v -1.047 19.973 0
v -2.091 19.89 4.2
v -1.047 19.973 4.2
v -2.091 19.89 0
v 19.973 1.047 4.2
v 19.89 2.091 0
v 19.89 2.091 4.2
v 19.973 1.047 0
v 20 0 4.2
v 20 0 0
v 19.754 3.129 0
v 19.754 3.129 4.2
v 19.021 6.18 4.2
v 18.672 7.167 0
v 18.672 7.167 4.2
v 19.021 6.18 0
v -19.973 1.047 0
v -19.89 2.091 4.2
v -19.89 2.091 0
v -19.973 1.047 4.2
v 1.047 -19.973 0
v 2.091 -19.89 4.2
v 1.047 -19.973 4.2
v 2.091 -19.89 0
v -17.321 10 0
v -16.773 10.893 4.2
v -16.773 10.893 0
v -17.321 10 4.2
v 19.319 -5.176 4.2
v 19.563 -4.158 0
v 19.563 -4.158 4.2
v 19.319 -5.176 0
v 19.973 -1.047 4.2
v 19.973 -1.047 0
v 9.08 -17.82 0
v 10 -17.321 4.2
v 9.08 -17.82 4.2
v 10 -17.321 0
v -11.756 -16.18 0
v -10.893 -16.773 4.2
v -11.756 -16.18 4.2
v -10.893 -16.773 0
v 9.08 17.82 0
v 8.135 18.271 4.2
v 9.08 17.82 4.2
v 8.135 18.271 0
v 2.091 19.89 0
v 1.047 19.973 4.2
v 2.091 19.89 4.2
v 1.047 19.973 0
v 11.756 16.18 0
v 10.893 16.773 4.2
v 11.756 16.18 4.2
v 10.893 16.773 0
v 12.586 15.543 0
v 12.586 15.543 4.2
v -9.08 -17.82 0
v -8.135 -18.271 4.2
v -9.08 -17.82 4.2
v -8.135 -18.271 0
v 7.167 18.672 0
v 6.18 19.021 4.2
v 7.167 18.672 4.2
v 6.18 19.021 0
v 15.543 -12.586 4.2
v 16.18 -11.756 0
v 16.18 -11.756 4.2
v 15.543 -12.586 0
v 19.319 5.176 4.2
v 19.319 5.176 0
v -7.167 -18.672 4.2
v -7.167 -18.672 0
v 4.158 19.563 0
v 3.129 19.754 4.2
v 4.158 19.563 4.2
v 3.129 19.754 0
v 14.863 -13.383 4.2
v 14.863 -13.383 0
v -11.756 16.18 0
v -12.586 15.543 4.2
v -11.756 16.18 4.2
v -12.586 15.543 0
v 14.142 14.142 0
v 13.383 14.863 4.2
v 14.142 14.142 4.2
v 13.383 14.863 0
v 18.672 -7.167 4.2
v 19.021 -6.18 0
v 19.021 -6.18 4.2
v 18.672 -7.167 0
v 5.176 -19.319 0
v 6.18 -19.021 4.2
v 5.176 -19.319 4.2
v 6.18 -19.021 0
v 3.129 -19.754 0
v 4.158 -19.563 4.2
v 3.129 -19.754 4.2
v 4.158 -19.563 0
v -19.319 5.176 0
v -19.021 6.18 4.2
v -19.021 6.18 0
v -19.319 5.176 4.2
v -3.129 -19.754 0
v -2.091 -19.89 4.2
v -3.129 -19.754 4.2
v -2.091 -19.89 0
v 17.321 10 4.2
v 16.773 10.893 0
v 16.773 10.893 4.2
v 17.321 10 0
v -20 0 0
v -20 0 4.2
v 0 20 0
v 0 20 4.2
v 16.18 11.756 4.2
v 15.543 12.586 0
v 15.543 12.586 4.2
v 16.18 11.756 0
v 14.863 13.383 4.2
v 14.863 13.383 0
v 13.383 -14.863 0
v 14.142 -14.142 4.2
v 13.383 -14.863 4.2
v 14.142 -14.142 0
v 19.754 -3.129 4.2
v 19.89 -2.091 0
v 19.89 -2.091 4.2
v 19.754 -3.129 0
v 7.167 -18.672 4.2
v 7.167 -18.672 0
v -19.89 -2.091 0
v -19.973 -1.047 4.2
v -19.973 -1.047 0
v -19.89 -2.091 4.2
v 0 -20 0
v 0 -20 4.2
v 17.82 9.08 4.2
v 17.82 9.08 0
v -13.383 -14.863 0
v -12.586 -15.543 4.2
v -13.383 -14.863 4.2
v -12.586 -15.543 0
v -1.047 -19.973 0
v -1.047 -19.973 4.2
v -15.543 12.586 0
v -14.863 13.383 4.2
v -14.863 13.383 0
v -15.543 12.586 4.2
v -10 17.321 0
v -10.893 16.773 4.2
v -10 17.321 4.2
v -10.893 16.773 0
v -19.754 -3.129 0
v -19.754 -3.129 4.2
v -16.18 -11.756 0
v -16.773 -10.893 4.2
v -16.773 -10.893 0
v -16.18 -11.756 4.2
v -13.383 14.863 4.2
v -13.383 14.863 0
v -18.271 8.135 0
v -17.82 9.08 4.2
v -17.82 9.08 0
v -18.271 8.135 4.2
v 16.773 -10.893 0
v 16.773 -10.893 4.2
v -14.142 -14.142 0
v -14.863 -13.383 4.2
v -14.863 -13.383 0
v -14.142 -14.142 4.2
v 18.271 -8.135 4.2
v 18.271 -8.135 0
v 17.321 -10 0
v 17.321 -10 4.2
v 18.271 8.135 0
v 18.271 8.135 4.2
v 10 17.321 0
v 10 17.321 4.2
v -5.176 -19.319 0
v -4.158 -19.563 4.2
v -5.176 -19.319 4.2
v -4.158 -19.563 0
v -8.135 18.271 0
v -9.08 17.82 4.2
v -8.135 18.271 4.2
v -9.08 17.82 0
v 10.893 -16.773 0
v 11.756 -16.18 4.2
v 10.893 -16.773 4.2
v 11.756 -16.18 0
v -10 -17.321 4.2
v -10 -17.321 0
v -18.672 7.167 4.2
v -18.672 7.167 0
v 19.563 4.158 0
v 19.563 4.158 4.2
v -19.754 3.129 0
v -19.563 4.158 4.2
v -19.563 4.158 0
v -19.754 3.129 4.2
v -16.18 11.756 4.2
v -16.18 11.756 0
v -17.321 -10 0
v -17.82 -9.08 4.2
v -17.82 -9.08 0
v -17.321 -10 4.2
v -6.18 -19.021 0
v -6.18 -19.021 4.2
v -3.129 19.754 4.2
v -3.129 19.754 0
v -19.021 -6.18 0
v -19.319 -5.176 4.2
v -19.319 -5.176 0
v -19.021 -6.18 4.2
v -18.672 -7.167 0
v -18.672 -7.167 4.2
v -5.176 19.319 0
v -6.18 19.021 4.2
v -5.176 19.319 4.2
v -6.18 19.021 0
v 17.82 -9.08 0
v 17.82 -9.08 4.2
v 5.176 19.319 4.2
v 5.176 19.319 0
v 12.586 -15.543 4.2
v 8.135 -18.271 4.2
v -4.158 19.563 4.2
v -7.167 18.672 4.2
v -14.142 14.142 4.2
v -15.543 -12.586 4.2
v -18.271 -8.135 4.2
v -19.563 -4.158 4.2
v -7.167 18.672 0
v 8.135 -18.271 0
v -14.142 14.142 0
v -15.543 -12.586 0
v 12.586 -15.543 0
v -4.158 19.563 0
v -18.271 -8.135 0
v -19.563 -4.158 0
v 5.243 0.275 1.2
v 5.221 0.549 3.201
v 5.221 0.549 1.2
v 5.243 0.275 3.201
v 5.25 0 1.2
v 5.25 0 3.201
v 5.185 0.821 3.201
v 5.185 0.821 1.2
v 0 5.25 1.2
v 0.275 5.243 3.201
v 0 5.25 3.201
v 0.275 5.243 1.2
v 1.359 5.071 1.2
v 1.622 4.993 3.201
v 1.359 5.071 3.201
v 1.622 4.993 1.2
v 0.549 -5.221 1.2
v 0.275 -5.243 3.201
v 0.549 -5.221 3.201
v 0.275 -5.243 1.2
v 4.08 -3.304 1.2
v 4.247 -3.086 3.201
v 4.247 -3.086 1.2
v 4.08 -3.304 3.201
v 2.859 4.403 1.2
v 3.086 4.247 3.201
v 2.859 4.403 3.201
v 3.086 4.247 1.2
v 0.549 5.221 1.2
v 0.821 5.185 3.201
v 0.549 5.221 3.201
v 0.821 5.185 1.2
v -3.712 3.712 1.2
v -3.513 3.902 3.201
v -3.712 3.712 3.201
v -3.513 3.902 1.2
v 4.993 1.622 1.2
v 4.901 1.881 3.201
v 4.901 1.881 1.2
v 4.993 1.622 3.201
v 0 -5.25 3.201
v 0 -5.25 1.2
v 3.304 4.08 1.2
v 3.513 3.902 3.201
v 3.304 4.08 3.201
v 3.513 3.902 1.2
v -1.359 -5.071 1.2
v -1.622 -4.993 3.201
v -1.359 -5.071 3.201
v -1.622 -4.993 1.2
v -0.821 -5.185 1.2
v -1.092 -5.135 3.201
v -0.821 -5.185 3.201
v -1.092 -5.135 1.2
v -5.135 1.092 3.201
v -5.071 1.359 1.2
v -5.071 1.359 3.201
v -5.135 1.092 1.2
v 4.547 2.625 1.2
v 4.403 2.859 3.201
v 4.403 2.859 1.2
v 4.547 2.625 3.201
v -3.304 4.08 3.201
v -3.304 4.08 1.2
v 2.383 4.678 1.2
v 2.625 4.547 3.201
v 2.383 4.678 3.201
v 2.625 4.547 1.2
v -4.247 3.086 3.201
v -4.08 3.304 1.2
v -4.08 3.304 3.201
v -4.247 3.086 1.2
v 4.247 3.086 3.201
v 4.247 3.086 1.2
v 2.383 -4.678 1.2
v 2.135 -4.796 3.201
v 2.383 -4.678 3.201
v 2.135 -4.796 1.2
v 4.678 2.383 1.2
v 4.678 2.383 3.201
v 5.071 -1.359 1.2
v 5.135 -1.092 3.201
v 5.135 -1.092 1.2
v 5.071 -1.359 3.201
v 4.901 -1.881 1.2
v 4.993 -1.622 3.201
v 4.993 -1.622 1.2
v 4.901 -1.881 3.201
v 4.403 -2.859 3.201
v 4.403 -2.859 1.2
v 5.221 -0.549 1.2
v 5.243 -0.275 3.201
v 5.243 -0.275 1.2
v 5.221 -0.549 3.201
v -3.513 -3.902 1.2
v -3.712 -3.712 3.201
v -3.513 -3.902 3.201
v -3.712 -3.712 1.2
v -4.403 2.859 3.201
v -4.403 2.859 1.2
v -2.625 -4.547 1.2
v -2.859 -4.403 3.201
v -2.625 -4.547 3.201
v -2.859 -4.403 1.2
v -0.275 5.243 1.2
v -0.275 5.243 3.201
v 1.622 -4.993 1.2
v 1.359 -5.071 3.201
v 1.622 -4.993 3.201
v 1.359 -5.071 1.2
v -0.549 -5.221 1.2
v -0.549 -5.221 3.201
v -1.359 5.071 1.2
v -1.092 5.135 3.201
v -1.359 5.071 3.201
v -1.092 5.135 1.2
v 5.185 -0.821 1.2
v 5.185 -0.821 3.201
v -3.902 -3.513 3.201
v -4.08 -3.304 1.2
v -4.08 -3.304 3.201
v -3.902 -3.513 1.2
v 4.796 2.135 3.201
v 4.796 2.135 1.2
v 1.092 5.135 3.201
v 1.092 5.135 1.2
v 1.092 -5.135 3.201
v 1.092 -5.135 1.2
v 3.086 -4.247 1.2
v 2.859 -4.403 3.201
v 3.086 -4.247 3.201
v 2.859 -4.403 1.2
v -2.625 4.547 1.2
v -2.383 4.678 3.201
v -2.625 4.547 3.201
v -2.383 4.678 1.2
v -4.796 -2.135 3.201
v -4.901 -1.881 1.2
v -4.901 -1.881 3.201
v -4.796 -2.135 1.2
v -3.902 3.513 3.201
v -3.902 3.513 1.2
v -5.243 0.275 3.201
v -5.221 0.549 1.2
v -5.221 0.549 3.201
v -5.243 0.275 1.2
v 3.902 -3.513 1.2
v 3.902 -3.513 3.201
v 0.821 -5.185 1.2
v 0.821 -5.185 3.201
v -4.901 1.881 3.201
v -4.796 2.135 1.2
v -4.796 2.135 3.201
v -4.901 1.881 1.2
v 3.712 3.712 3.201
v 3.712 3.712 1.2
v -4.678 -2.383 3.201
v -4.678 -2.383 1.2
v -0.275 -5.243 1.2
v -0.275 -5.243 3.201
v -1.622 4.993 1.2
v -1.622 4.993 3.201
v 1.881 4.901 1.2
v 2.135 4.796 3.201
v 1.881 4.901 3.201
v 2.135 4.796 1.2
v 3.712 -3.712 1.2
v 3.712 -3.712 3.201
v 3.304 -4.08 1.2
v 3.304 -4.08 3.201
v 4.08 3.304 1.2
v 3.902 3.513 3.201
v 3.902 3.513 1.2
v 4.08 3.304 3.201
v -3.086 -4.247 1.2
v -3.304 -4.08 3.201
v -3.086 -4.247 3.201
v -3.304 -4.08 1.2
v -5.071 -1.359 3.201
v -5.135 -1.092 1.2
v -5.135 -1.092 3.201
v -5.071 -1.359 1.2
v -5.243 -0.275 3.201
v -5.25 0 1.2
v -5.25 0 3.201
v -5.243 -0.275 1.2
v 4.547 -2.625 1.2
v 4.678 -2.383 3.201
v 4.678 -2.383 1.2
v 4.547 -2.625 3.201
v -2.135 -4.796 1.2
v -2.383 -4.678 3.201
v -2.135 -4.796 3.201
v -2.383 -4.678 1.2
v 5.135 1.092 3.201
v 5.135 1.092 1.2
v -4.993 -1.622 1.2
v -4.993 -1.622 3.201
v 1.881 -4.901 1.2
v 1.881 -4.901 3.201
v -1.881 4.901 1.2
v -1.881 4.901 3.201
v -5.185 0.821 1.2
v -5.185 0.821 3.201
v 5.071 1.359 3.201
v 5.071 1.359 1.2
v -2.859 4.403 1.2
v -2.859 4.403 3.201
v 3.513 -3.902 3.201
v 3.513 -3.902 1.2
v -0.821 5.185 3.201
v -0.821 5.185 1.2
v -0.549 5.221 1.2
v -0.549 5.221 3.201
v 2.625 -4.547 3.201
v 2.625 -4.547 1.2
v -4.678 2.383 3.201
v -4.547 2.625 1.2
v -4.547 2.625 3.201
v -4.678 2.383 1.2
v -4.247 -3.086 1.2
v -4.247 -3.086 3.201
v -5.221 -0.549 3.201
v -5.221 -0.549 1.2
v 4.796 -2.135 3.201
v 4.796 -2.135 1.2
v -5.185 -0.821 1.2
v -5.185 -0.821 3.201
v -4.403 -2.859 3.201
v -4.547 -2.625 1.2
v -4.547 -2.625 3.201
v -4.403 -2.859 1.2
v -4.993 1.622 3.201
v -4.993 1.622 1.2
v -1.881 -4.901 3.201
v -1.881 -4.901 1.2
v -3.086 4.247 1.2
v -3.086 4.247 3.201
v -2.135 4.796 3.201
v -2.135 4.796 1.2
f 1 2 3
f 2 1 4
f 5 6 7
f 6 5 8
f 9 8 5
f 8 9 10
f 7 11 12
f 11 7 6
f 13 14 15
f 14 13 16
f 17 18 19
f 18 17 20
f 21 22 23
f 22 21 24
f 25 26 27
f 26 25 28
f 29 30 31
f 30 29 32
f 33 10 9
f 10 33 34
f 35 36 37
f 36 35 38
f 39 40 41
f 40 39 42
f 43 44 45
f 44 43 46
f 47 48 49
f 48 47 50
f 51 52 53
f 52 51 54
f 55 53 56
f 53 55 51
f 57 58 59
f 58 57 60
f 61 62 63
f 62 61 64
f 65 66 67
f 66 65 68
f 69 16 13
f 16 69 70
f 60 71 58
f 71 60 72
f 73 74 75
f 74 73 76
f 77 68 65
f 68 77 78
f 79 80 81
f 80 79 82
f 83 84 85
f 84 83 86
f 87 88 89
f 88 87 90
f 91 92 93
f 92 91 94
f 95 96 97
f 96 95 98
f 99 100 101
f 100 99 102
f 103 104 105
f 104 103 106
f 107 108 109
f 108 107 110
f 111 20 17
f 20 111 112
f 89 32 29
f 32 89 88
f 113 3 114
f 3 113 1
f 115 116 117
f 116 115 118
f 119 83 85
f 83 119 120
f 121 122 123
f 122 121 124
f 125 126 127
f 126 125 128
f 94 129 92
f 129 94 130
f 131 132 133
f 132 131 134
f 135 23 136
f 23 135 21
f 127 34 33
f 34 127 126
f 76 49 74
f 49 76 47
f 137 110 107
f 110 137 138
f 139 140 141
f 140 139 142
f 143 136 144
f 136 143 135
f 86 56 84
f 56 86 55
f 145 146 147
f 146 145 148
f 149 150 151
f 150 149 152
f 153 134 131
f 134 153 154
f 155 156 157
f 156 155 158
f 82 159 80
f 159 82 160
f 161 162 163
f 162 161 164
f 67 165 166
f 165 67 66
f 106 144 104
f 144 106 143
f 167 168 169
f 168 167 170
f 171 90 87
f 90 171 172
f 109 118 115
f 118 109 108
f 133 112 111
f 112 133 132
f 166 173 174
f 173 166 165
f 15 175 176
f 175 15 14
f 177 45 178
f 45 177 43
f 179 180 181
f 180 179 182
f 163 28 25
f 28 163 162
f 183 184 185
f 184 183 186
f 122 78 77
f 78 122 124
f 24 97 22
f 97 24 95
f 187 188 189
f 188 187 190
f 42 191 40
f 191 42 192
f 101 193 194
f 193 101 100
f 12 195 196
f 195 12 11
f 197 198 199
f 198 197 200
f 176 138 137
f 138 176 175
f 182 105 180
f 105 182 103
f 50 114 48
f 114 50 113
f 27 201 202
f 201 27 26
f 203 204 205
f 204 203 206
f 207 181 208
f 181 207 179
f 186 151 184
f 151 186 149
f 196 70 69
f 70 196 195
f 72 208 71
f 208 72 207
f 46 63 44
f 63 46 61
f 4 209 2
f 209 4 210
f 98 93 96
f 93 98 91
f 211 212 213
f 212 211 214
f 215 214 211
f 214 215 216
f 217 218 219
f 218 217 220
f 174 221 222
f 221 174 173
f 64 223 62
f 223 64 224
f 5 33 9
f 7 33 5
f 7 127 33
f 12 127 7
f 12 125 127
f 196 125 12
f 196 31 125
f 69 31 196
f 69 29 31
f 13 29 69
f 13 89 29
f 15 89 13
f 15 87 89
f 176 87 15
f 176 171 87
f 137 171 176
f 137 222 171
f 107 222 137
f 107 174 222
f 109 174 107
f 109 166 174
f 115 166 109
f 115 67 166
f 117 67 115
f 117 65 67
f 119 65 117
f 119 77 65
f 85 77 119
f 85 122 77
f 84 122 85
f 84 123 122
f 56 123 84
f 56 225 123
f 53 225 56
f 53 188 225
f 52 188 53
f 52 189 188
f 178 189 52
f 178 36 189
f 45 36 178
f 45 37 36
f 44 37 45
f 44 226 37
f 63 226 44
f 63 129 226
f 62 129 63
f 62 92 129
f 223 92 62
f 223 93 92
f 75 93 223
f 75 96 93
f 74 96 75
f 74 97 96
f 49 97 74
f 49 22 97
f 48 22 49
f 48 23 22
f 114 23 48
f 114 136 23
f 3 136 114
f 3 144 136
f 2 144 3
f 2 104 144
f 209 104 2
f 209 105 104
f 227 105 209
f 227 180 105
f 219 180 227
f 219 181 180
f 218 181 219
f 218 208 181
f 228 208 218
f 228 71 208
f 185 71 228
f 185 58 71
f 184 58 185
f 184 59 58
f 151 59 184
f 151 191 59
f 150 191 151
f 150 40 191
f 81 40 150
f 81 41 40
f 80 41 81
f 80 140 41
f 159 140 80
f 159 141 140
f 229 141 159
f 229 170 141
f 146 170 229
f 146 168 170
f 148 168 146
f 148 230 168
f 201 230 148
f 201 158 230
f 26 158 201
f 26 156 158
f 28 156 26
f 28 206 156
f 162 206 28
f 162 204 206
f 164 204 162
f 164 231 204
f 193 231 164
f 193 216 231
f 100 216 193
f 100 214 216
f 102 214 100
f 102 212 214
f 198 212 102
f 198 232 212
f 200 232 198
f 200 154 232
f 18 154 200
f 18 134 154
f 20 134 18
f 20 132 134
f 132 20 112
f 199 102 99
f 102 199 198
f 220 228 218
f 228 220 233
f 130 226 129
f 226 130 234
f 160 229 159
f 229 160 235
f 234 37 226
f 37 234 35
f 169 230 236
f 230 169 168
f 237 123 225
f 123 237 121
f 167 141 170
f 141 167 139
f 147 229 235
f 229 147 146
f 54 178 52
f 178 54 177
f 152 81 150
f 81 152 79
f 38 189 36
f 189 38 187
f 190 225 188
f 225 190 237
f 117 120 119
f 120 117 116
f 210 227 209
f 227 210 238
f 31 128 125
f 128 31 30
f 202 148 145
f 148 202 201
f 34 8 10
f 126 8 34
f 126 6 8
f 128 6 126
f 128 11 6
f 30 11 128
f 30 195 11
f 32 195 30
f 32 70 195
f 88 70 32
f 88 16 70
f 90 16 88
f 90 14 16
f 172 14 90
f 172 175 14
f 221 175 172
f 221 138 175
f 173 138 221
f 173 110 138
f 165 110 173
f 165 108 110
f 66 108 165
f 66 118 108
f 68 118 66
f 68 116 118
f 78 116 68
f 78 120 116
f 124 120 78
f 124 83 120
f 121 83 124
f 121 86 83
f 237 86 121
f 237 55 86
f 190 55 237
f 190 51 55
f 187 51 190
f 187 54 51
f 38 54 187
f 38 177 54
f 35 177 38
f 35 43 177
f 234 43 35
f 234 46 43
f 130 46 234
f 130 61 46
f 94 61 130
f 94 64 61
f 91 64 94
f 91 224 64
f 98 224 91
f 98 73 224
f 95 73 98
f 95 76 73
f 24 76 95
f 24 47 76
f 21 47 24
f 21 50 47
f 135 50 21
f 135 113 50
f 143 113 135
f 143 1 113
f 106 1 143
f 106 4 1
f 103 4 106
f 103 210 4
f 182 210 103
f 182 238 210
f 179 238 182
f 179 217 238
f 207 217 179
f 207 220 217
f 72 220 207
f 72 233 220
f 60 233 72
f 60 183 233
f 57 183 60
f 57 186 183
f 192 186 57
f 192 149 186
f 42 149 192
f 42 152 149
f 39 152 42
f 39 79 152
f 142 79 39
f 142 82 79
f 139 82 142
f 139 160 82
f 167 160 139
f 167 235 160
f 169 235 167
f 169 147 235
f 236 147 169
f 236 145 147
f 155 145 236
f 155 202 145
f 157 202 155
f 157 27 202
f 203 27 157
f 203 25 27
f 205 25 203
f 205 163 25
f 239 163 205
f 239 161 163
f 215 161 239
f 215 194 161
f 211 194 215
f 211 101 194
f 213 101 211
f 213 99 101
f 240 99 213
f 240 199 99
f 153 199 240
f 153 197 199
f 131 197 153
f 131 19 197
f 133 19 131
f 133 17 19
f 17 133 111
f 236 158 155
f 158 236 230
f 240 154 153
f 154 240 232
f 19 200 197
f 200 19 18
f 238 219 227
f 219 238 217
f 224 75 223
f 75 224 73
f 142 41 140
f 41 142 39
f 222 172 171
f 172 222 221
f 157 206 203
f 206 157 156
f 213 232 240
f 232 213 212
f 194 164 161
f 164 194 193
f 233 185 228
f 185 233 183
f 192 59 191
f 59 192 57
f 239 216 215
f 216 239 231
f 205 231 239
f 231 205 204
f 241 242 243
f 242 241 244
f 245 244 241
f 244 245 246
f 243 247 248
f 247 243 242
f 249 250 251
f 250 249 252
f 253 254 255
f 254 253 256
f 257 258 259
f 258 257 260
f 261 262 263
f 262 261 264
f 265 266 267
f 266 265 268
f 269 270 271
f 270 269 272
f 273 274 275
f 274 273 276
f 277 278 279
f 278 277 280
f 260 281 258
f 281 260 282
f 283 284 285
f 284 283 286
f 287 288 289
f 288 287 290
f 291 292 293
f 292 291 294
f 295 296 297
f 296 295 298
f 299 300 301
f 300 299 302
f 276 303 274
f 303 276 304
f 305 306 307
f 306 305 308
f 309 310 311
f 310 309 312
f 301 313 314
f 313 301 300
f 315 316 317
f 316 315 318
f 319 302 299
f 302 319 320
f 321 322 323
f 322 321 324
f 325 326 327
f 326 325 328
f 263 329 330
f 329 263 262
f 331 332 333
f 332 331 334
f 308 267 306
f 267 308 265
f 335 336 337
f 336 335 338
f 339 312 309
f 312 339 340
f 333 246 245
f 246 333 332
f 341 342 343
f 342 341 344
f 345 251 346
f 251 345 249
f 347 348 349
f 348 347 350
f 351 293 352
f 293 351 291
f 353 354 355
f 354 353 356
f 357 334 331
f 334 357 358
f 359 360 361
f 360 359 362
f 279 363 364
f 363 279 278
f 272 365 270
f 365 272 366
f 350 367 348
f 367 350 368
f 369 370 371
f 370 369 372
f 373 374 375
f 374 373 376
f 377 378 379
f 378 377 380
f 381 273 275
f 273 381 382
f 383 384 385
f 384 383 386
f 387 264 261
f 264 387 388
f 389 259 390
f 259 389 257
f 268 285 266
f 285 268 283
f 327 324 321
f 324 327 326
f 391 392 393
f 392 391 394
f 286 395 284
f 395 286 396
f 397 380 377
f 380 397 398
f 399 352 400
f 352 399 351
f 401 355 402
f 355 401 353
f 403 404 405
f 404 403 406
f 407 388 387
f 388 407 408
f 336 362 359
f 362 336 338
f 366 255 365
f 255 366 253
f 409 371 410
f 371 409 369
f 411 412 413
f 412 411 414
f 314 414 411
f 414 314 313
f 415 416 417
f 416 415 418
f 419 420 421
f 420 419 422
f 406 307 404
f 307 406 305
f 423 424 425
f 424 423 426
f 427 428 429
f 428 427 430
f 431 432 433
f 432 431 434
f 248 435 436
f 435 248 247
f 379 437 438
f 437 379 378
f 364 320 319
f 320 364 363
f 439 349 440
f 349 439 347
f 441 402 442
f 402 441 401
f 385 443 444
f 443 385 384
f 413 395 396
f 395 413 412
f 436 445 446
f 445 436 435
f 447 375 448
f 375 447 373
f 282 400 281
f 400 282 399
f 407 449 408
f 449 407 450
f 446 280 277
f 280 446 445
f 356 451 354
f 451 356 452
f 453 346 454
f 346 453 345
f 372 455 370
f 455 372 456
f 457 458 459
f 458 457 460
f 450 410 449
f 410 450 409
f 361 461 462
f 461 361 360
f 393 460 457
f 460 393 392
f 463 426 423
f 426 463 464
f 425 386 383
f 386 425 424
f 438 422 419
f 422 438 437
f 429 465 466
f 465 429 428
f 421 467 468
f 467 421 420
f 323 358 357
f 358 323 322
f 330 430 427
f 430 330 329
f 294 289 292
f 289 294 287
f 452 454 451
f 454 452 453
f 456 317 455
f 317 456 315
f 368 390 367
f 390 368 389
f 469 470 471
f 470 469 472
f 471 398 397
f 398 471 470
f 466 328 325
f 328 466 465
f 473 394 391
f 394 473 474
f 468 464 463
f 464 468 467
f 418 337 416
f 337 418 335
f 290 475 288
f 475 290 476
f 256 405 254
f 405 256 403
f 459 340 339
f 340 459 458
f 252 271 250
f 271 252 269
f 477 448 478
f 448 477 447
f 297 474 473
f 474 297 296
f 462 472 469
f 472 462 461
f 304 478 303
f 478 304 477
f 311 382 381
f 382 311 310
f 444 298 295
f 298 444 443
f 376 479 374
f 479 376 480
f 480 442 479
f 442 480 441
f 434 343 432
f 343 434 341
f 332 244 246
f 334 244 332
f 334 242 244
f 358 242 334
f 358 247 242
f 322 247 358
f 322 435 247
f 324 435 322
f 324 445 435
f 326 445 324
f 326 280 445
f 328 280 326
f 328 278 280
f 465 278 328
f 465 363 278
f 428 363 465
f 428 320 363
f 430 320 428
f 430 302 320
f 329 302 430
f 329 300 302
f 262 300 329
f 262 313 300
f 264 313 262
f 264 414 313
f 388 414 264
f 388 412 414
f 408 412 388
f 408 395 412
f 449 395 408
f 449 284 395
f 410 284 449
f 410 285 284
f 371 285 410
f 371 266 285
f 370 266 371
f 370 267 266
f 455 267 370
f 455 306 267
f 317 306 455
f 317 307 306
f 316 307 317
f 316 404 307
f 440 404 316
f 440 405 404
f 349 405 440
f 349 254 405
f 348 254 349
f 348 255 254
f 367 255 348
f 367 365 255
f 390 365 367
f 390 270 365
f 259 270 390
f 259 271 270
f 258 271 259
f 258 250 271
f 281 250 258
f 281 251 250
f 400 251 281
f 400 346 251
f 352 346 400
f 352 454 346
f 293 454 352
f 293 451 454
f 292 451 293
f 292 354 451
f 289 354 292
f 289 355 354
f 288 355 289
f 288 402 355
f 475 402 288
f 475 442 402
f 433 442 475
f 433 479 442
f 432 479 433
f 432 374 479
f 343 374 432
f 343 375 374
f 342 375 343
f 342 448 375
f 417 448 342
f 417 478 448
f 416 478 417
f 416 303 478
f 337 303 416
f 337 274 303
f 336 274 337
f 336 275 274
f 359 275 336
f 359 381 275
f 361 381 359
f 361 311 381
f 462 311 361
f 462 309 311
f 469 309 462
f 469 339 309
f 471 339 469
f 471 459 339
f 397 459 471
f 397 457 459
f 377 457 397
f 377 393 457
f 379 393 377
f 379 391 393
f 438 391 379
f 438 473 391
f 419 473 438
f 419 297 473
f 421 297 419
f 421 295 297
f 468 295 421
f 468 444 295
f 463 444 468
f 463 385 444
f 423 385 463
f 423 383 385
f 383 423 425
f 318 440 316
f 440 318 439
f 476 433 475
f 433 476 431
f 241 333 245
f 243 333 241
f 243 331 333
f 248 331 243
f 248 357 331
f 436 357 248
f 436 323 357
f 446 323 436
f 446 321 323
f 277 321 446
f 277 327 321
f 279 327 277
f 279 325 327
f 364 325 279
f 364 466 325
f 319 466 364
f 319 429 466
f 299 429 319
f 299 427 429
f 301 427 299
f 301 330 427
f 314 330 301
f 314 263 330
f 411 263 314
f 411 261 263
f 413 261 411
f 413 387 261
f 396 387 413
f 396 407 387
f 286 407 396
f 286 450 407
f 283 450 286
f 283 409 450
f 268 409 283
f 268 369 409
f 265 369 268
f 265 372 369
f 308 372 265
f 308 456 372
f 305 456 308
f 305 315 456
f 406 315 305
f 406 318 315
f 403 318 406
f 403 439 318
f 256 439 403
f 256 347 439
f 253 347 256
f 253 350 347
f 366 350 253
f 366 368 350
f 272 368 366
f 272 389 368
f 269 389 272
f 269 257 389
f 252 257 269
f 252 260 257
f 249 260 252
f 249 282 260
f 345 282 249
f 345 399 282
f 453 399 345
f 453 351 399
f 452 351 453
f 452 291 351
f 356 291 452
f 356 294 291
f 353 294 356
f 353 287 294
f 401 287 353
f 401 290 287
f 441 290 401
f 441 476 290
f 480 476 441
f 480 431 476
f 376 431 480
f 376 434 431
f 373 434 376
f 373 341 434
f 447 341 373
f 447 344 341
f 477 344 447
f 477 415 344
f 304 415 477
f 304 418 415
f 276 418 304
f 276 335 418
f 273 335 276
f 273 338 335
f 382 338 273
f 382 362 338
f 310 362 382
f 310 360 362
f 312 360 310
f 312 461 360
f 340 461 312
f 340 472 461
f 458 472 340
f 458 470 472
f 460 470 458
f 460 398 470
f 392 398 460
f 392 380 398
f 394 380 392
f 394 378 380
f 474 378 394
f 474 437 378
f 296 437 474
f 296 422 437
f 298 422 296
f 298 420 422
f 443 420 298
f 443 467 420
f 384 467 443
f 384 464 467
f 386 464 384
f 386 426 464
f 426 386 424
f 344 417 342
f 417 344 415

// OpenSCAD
/*
  Magnet-Token with Encapsulated Pocket (pause-and-drop workflow)
  Defaults: token Ø40, magnet 10×2 mm, base 1.2 mm, cover 1.0 mm.
*/
token_d = 40;
base_t  = 1.2;
magnet_d= 10.0;
magnet_t= 2.0;
cover_t = 1.0;
clearance = 0.25; // radial (per side)
$fn = 120;
token_h = base_t + magnet_t + cover_t;
module token(){
  difference(){
    cylinder(h=token_h, r=token_d/2);
    translate([0,0,base_t]) cylinder(h=magnet_t+0.001, r=(magnet_d/2)+clearance);
  }
}
token();
// Pause height target: base_t + magnet_t
